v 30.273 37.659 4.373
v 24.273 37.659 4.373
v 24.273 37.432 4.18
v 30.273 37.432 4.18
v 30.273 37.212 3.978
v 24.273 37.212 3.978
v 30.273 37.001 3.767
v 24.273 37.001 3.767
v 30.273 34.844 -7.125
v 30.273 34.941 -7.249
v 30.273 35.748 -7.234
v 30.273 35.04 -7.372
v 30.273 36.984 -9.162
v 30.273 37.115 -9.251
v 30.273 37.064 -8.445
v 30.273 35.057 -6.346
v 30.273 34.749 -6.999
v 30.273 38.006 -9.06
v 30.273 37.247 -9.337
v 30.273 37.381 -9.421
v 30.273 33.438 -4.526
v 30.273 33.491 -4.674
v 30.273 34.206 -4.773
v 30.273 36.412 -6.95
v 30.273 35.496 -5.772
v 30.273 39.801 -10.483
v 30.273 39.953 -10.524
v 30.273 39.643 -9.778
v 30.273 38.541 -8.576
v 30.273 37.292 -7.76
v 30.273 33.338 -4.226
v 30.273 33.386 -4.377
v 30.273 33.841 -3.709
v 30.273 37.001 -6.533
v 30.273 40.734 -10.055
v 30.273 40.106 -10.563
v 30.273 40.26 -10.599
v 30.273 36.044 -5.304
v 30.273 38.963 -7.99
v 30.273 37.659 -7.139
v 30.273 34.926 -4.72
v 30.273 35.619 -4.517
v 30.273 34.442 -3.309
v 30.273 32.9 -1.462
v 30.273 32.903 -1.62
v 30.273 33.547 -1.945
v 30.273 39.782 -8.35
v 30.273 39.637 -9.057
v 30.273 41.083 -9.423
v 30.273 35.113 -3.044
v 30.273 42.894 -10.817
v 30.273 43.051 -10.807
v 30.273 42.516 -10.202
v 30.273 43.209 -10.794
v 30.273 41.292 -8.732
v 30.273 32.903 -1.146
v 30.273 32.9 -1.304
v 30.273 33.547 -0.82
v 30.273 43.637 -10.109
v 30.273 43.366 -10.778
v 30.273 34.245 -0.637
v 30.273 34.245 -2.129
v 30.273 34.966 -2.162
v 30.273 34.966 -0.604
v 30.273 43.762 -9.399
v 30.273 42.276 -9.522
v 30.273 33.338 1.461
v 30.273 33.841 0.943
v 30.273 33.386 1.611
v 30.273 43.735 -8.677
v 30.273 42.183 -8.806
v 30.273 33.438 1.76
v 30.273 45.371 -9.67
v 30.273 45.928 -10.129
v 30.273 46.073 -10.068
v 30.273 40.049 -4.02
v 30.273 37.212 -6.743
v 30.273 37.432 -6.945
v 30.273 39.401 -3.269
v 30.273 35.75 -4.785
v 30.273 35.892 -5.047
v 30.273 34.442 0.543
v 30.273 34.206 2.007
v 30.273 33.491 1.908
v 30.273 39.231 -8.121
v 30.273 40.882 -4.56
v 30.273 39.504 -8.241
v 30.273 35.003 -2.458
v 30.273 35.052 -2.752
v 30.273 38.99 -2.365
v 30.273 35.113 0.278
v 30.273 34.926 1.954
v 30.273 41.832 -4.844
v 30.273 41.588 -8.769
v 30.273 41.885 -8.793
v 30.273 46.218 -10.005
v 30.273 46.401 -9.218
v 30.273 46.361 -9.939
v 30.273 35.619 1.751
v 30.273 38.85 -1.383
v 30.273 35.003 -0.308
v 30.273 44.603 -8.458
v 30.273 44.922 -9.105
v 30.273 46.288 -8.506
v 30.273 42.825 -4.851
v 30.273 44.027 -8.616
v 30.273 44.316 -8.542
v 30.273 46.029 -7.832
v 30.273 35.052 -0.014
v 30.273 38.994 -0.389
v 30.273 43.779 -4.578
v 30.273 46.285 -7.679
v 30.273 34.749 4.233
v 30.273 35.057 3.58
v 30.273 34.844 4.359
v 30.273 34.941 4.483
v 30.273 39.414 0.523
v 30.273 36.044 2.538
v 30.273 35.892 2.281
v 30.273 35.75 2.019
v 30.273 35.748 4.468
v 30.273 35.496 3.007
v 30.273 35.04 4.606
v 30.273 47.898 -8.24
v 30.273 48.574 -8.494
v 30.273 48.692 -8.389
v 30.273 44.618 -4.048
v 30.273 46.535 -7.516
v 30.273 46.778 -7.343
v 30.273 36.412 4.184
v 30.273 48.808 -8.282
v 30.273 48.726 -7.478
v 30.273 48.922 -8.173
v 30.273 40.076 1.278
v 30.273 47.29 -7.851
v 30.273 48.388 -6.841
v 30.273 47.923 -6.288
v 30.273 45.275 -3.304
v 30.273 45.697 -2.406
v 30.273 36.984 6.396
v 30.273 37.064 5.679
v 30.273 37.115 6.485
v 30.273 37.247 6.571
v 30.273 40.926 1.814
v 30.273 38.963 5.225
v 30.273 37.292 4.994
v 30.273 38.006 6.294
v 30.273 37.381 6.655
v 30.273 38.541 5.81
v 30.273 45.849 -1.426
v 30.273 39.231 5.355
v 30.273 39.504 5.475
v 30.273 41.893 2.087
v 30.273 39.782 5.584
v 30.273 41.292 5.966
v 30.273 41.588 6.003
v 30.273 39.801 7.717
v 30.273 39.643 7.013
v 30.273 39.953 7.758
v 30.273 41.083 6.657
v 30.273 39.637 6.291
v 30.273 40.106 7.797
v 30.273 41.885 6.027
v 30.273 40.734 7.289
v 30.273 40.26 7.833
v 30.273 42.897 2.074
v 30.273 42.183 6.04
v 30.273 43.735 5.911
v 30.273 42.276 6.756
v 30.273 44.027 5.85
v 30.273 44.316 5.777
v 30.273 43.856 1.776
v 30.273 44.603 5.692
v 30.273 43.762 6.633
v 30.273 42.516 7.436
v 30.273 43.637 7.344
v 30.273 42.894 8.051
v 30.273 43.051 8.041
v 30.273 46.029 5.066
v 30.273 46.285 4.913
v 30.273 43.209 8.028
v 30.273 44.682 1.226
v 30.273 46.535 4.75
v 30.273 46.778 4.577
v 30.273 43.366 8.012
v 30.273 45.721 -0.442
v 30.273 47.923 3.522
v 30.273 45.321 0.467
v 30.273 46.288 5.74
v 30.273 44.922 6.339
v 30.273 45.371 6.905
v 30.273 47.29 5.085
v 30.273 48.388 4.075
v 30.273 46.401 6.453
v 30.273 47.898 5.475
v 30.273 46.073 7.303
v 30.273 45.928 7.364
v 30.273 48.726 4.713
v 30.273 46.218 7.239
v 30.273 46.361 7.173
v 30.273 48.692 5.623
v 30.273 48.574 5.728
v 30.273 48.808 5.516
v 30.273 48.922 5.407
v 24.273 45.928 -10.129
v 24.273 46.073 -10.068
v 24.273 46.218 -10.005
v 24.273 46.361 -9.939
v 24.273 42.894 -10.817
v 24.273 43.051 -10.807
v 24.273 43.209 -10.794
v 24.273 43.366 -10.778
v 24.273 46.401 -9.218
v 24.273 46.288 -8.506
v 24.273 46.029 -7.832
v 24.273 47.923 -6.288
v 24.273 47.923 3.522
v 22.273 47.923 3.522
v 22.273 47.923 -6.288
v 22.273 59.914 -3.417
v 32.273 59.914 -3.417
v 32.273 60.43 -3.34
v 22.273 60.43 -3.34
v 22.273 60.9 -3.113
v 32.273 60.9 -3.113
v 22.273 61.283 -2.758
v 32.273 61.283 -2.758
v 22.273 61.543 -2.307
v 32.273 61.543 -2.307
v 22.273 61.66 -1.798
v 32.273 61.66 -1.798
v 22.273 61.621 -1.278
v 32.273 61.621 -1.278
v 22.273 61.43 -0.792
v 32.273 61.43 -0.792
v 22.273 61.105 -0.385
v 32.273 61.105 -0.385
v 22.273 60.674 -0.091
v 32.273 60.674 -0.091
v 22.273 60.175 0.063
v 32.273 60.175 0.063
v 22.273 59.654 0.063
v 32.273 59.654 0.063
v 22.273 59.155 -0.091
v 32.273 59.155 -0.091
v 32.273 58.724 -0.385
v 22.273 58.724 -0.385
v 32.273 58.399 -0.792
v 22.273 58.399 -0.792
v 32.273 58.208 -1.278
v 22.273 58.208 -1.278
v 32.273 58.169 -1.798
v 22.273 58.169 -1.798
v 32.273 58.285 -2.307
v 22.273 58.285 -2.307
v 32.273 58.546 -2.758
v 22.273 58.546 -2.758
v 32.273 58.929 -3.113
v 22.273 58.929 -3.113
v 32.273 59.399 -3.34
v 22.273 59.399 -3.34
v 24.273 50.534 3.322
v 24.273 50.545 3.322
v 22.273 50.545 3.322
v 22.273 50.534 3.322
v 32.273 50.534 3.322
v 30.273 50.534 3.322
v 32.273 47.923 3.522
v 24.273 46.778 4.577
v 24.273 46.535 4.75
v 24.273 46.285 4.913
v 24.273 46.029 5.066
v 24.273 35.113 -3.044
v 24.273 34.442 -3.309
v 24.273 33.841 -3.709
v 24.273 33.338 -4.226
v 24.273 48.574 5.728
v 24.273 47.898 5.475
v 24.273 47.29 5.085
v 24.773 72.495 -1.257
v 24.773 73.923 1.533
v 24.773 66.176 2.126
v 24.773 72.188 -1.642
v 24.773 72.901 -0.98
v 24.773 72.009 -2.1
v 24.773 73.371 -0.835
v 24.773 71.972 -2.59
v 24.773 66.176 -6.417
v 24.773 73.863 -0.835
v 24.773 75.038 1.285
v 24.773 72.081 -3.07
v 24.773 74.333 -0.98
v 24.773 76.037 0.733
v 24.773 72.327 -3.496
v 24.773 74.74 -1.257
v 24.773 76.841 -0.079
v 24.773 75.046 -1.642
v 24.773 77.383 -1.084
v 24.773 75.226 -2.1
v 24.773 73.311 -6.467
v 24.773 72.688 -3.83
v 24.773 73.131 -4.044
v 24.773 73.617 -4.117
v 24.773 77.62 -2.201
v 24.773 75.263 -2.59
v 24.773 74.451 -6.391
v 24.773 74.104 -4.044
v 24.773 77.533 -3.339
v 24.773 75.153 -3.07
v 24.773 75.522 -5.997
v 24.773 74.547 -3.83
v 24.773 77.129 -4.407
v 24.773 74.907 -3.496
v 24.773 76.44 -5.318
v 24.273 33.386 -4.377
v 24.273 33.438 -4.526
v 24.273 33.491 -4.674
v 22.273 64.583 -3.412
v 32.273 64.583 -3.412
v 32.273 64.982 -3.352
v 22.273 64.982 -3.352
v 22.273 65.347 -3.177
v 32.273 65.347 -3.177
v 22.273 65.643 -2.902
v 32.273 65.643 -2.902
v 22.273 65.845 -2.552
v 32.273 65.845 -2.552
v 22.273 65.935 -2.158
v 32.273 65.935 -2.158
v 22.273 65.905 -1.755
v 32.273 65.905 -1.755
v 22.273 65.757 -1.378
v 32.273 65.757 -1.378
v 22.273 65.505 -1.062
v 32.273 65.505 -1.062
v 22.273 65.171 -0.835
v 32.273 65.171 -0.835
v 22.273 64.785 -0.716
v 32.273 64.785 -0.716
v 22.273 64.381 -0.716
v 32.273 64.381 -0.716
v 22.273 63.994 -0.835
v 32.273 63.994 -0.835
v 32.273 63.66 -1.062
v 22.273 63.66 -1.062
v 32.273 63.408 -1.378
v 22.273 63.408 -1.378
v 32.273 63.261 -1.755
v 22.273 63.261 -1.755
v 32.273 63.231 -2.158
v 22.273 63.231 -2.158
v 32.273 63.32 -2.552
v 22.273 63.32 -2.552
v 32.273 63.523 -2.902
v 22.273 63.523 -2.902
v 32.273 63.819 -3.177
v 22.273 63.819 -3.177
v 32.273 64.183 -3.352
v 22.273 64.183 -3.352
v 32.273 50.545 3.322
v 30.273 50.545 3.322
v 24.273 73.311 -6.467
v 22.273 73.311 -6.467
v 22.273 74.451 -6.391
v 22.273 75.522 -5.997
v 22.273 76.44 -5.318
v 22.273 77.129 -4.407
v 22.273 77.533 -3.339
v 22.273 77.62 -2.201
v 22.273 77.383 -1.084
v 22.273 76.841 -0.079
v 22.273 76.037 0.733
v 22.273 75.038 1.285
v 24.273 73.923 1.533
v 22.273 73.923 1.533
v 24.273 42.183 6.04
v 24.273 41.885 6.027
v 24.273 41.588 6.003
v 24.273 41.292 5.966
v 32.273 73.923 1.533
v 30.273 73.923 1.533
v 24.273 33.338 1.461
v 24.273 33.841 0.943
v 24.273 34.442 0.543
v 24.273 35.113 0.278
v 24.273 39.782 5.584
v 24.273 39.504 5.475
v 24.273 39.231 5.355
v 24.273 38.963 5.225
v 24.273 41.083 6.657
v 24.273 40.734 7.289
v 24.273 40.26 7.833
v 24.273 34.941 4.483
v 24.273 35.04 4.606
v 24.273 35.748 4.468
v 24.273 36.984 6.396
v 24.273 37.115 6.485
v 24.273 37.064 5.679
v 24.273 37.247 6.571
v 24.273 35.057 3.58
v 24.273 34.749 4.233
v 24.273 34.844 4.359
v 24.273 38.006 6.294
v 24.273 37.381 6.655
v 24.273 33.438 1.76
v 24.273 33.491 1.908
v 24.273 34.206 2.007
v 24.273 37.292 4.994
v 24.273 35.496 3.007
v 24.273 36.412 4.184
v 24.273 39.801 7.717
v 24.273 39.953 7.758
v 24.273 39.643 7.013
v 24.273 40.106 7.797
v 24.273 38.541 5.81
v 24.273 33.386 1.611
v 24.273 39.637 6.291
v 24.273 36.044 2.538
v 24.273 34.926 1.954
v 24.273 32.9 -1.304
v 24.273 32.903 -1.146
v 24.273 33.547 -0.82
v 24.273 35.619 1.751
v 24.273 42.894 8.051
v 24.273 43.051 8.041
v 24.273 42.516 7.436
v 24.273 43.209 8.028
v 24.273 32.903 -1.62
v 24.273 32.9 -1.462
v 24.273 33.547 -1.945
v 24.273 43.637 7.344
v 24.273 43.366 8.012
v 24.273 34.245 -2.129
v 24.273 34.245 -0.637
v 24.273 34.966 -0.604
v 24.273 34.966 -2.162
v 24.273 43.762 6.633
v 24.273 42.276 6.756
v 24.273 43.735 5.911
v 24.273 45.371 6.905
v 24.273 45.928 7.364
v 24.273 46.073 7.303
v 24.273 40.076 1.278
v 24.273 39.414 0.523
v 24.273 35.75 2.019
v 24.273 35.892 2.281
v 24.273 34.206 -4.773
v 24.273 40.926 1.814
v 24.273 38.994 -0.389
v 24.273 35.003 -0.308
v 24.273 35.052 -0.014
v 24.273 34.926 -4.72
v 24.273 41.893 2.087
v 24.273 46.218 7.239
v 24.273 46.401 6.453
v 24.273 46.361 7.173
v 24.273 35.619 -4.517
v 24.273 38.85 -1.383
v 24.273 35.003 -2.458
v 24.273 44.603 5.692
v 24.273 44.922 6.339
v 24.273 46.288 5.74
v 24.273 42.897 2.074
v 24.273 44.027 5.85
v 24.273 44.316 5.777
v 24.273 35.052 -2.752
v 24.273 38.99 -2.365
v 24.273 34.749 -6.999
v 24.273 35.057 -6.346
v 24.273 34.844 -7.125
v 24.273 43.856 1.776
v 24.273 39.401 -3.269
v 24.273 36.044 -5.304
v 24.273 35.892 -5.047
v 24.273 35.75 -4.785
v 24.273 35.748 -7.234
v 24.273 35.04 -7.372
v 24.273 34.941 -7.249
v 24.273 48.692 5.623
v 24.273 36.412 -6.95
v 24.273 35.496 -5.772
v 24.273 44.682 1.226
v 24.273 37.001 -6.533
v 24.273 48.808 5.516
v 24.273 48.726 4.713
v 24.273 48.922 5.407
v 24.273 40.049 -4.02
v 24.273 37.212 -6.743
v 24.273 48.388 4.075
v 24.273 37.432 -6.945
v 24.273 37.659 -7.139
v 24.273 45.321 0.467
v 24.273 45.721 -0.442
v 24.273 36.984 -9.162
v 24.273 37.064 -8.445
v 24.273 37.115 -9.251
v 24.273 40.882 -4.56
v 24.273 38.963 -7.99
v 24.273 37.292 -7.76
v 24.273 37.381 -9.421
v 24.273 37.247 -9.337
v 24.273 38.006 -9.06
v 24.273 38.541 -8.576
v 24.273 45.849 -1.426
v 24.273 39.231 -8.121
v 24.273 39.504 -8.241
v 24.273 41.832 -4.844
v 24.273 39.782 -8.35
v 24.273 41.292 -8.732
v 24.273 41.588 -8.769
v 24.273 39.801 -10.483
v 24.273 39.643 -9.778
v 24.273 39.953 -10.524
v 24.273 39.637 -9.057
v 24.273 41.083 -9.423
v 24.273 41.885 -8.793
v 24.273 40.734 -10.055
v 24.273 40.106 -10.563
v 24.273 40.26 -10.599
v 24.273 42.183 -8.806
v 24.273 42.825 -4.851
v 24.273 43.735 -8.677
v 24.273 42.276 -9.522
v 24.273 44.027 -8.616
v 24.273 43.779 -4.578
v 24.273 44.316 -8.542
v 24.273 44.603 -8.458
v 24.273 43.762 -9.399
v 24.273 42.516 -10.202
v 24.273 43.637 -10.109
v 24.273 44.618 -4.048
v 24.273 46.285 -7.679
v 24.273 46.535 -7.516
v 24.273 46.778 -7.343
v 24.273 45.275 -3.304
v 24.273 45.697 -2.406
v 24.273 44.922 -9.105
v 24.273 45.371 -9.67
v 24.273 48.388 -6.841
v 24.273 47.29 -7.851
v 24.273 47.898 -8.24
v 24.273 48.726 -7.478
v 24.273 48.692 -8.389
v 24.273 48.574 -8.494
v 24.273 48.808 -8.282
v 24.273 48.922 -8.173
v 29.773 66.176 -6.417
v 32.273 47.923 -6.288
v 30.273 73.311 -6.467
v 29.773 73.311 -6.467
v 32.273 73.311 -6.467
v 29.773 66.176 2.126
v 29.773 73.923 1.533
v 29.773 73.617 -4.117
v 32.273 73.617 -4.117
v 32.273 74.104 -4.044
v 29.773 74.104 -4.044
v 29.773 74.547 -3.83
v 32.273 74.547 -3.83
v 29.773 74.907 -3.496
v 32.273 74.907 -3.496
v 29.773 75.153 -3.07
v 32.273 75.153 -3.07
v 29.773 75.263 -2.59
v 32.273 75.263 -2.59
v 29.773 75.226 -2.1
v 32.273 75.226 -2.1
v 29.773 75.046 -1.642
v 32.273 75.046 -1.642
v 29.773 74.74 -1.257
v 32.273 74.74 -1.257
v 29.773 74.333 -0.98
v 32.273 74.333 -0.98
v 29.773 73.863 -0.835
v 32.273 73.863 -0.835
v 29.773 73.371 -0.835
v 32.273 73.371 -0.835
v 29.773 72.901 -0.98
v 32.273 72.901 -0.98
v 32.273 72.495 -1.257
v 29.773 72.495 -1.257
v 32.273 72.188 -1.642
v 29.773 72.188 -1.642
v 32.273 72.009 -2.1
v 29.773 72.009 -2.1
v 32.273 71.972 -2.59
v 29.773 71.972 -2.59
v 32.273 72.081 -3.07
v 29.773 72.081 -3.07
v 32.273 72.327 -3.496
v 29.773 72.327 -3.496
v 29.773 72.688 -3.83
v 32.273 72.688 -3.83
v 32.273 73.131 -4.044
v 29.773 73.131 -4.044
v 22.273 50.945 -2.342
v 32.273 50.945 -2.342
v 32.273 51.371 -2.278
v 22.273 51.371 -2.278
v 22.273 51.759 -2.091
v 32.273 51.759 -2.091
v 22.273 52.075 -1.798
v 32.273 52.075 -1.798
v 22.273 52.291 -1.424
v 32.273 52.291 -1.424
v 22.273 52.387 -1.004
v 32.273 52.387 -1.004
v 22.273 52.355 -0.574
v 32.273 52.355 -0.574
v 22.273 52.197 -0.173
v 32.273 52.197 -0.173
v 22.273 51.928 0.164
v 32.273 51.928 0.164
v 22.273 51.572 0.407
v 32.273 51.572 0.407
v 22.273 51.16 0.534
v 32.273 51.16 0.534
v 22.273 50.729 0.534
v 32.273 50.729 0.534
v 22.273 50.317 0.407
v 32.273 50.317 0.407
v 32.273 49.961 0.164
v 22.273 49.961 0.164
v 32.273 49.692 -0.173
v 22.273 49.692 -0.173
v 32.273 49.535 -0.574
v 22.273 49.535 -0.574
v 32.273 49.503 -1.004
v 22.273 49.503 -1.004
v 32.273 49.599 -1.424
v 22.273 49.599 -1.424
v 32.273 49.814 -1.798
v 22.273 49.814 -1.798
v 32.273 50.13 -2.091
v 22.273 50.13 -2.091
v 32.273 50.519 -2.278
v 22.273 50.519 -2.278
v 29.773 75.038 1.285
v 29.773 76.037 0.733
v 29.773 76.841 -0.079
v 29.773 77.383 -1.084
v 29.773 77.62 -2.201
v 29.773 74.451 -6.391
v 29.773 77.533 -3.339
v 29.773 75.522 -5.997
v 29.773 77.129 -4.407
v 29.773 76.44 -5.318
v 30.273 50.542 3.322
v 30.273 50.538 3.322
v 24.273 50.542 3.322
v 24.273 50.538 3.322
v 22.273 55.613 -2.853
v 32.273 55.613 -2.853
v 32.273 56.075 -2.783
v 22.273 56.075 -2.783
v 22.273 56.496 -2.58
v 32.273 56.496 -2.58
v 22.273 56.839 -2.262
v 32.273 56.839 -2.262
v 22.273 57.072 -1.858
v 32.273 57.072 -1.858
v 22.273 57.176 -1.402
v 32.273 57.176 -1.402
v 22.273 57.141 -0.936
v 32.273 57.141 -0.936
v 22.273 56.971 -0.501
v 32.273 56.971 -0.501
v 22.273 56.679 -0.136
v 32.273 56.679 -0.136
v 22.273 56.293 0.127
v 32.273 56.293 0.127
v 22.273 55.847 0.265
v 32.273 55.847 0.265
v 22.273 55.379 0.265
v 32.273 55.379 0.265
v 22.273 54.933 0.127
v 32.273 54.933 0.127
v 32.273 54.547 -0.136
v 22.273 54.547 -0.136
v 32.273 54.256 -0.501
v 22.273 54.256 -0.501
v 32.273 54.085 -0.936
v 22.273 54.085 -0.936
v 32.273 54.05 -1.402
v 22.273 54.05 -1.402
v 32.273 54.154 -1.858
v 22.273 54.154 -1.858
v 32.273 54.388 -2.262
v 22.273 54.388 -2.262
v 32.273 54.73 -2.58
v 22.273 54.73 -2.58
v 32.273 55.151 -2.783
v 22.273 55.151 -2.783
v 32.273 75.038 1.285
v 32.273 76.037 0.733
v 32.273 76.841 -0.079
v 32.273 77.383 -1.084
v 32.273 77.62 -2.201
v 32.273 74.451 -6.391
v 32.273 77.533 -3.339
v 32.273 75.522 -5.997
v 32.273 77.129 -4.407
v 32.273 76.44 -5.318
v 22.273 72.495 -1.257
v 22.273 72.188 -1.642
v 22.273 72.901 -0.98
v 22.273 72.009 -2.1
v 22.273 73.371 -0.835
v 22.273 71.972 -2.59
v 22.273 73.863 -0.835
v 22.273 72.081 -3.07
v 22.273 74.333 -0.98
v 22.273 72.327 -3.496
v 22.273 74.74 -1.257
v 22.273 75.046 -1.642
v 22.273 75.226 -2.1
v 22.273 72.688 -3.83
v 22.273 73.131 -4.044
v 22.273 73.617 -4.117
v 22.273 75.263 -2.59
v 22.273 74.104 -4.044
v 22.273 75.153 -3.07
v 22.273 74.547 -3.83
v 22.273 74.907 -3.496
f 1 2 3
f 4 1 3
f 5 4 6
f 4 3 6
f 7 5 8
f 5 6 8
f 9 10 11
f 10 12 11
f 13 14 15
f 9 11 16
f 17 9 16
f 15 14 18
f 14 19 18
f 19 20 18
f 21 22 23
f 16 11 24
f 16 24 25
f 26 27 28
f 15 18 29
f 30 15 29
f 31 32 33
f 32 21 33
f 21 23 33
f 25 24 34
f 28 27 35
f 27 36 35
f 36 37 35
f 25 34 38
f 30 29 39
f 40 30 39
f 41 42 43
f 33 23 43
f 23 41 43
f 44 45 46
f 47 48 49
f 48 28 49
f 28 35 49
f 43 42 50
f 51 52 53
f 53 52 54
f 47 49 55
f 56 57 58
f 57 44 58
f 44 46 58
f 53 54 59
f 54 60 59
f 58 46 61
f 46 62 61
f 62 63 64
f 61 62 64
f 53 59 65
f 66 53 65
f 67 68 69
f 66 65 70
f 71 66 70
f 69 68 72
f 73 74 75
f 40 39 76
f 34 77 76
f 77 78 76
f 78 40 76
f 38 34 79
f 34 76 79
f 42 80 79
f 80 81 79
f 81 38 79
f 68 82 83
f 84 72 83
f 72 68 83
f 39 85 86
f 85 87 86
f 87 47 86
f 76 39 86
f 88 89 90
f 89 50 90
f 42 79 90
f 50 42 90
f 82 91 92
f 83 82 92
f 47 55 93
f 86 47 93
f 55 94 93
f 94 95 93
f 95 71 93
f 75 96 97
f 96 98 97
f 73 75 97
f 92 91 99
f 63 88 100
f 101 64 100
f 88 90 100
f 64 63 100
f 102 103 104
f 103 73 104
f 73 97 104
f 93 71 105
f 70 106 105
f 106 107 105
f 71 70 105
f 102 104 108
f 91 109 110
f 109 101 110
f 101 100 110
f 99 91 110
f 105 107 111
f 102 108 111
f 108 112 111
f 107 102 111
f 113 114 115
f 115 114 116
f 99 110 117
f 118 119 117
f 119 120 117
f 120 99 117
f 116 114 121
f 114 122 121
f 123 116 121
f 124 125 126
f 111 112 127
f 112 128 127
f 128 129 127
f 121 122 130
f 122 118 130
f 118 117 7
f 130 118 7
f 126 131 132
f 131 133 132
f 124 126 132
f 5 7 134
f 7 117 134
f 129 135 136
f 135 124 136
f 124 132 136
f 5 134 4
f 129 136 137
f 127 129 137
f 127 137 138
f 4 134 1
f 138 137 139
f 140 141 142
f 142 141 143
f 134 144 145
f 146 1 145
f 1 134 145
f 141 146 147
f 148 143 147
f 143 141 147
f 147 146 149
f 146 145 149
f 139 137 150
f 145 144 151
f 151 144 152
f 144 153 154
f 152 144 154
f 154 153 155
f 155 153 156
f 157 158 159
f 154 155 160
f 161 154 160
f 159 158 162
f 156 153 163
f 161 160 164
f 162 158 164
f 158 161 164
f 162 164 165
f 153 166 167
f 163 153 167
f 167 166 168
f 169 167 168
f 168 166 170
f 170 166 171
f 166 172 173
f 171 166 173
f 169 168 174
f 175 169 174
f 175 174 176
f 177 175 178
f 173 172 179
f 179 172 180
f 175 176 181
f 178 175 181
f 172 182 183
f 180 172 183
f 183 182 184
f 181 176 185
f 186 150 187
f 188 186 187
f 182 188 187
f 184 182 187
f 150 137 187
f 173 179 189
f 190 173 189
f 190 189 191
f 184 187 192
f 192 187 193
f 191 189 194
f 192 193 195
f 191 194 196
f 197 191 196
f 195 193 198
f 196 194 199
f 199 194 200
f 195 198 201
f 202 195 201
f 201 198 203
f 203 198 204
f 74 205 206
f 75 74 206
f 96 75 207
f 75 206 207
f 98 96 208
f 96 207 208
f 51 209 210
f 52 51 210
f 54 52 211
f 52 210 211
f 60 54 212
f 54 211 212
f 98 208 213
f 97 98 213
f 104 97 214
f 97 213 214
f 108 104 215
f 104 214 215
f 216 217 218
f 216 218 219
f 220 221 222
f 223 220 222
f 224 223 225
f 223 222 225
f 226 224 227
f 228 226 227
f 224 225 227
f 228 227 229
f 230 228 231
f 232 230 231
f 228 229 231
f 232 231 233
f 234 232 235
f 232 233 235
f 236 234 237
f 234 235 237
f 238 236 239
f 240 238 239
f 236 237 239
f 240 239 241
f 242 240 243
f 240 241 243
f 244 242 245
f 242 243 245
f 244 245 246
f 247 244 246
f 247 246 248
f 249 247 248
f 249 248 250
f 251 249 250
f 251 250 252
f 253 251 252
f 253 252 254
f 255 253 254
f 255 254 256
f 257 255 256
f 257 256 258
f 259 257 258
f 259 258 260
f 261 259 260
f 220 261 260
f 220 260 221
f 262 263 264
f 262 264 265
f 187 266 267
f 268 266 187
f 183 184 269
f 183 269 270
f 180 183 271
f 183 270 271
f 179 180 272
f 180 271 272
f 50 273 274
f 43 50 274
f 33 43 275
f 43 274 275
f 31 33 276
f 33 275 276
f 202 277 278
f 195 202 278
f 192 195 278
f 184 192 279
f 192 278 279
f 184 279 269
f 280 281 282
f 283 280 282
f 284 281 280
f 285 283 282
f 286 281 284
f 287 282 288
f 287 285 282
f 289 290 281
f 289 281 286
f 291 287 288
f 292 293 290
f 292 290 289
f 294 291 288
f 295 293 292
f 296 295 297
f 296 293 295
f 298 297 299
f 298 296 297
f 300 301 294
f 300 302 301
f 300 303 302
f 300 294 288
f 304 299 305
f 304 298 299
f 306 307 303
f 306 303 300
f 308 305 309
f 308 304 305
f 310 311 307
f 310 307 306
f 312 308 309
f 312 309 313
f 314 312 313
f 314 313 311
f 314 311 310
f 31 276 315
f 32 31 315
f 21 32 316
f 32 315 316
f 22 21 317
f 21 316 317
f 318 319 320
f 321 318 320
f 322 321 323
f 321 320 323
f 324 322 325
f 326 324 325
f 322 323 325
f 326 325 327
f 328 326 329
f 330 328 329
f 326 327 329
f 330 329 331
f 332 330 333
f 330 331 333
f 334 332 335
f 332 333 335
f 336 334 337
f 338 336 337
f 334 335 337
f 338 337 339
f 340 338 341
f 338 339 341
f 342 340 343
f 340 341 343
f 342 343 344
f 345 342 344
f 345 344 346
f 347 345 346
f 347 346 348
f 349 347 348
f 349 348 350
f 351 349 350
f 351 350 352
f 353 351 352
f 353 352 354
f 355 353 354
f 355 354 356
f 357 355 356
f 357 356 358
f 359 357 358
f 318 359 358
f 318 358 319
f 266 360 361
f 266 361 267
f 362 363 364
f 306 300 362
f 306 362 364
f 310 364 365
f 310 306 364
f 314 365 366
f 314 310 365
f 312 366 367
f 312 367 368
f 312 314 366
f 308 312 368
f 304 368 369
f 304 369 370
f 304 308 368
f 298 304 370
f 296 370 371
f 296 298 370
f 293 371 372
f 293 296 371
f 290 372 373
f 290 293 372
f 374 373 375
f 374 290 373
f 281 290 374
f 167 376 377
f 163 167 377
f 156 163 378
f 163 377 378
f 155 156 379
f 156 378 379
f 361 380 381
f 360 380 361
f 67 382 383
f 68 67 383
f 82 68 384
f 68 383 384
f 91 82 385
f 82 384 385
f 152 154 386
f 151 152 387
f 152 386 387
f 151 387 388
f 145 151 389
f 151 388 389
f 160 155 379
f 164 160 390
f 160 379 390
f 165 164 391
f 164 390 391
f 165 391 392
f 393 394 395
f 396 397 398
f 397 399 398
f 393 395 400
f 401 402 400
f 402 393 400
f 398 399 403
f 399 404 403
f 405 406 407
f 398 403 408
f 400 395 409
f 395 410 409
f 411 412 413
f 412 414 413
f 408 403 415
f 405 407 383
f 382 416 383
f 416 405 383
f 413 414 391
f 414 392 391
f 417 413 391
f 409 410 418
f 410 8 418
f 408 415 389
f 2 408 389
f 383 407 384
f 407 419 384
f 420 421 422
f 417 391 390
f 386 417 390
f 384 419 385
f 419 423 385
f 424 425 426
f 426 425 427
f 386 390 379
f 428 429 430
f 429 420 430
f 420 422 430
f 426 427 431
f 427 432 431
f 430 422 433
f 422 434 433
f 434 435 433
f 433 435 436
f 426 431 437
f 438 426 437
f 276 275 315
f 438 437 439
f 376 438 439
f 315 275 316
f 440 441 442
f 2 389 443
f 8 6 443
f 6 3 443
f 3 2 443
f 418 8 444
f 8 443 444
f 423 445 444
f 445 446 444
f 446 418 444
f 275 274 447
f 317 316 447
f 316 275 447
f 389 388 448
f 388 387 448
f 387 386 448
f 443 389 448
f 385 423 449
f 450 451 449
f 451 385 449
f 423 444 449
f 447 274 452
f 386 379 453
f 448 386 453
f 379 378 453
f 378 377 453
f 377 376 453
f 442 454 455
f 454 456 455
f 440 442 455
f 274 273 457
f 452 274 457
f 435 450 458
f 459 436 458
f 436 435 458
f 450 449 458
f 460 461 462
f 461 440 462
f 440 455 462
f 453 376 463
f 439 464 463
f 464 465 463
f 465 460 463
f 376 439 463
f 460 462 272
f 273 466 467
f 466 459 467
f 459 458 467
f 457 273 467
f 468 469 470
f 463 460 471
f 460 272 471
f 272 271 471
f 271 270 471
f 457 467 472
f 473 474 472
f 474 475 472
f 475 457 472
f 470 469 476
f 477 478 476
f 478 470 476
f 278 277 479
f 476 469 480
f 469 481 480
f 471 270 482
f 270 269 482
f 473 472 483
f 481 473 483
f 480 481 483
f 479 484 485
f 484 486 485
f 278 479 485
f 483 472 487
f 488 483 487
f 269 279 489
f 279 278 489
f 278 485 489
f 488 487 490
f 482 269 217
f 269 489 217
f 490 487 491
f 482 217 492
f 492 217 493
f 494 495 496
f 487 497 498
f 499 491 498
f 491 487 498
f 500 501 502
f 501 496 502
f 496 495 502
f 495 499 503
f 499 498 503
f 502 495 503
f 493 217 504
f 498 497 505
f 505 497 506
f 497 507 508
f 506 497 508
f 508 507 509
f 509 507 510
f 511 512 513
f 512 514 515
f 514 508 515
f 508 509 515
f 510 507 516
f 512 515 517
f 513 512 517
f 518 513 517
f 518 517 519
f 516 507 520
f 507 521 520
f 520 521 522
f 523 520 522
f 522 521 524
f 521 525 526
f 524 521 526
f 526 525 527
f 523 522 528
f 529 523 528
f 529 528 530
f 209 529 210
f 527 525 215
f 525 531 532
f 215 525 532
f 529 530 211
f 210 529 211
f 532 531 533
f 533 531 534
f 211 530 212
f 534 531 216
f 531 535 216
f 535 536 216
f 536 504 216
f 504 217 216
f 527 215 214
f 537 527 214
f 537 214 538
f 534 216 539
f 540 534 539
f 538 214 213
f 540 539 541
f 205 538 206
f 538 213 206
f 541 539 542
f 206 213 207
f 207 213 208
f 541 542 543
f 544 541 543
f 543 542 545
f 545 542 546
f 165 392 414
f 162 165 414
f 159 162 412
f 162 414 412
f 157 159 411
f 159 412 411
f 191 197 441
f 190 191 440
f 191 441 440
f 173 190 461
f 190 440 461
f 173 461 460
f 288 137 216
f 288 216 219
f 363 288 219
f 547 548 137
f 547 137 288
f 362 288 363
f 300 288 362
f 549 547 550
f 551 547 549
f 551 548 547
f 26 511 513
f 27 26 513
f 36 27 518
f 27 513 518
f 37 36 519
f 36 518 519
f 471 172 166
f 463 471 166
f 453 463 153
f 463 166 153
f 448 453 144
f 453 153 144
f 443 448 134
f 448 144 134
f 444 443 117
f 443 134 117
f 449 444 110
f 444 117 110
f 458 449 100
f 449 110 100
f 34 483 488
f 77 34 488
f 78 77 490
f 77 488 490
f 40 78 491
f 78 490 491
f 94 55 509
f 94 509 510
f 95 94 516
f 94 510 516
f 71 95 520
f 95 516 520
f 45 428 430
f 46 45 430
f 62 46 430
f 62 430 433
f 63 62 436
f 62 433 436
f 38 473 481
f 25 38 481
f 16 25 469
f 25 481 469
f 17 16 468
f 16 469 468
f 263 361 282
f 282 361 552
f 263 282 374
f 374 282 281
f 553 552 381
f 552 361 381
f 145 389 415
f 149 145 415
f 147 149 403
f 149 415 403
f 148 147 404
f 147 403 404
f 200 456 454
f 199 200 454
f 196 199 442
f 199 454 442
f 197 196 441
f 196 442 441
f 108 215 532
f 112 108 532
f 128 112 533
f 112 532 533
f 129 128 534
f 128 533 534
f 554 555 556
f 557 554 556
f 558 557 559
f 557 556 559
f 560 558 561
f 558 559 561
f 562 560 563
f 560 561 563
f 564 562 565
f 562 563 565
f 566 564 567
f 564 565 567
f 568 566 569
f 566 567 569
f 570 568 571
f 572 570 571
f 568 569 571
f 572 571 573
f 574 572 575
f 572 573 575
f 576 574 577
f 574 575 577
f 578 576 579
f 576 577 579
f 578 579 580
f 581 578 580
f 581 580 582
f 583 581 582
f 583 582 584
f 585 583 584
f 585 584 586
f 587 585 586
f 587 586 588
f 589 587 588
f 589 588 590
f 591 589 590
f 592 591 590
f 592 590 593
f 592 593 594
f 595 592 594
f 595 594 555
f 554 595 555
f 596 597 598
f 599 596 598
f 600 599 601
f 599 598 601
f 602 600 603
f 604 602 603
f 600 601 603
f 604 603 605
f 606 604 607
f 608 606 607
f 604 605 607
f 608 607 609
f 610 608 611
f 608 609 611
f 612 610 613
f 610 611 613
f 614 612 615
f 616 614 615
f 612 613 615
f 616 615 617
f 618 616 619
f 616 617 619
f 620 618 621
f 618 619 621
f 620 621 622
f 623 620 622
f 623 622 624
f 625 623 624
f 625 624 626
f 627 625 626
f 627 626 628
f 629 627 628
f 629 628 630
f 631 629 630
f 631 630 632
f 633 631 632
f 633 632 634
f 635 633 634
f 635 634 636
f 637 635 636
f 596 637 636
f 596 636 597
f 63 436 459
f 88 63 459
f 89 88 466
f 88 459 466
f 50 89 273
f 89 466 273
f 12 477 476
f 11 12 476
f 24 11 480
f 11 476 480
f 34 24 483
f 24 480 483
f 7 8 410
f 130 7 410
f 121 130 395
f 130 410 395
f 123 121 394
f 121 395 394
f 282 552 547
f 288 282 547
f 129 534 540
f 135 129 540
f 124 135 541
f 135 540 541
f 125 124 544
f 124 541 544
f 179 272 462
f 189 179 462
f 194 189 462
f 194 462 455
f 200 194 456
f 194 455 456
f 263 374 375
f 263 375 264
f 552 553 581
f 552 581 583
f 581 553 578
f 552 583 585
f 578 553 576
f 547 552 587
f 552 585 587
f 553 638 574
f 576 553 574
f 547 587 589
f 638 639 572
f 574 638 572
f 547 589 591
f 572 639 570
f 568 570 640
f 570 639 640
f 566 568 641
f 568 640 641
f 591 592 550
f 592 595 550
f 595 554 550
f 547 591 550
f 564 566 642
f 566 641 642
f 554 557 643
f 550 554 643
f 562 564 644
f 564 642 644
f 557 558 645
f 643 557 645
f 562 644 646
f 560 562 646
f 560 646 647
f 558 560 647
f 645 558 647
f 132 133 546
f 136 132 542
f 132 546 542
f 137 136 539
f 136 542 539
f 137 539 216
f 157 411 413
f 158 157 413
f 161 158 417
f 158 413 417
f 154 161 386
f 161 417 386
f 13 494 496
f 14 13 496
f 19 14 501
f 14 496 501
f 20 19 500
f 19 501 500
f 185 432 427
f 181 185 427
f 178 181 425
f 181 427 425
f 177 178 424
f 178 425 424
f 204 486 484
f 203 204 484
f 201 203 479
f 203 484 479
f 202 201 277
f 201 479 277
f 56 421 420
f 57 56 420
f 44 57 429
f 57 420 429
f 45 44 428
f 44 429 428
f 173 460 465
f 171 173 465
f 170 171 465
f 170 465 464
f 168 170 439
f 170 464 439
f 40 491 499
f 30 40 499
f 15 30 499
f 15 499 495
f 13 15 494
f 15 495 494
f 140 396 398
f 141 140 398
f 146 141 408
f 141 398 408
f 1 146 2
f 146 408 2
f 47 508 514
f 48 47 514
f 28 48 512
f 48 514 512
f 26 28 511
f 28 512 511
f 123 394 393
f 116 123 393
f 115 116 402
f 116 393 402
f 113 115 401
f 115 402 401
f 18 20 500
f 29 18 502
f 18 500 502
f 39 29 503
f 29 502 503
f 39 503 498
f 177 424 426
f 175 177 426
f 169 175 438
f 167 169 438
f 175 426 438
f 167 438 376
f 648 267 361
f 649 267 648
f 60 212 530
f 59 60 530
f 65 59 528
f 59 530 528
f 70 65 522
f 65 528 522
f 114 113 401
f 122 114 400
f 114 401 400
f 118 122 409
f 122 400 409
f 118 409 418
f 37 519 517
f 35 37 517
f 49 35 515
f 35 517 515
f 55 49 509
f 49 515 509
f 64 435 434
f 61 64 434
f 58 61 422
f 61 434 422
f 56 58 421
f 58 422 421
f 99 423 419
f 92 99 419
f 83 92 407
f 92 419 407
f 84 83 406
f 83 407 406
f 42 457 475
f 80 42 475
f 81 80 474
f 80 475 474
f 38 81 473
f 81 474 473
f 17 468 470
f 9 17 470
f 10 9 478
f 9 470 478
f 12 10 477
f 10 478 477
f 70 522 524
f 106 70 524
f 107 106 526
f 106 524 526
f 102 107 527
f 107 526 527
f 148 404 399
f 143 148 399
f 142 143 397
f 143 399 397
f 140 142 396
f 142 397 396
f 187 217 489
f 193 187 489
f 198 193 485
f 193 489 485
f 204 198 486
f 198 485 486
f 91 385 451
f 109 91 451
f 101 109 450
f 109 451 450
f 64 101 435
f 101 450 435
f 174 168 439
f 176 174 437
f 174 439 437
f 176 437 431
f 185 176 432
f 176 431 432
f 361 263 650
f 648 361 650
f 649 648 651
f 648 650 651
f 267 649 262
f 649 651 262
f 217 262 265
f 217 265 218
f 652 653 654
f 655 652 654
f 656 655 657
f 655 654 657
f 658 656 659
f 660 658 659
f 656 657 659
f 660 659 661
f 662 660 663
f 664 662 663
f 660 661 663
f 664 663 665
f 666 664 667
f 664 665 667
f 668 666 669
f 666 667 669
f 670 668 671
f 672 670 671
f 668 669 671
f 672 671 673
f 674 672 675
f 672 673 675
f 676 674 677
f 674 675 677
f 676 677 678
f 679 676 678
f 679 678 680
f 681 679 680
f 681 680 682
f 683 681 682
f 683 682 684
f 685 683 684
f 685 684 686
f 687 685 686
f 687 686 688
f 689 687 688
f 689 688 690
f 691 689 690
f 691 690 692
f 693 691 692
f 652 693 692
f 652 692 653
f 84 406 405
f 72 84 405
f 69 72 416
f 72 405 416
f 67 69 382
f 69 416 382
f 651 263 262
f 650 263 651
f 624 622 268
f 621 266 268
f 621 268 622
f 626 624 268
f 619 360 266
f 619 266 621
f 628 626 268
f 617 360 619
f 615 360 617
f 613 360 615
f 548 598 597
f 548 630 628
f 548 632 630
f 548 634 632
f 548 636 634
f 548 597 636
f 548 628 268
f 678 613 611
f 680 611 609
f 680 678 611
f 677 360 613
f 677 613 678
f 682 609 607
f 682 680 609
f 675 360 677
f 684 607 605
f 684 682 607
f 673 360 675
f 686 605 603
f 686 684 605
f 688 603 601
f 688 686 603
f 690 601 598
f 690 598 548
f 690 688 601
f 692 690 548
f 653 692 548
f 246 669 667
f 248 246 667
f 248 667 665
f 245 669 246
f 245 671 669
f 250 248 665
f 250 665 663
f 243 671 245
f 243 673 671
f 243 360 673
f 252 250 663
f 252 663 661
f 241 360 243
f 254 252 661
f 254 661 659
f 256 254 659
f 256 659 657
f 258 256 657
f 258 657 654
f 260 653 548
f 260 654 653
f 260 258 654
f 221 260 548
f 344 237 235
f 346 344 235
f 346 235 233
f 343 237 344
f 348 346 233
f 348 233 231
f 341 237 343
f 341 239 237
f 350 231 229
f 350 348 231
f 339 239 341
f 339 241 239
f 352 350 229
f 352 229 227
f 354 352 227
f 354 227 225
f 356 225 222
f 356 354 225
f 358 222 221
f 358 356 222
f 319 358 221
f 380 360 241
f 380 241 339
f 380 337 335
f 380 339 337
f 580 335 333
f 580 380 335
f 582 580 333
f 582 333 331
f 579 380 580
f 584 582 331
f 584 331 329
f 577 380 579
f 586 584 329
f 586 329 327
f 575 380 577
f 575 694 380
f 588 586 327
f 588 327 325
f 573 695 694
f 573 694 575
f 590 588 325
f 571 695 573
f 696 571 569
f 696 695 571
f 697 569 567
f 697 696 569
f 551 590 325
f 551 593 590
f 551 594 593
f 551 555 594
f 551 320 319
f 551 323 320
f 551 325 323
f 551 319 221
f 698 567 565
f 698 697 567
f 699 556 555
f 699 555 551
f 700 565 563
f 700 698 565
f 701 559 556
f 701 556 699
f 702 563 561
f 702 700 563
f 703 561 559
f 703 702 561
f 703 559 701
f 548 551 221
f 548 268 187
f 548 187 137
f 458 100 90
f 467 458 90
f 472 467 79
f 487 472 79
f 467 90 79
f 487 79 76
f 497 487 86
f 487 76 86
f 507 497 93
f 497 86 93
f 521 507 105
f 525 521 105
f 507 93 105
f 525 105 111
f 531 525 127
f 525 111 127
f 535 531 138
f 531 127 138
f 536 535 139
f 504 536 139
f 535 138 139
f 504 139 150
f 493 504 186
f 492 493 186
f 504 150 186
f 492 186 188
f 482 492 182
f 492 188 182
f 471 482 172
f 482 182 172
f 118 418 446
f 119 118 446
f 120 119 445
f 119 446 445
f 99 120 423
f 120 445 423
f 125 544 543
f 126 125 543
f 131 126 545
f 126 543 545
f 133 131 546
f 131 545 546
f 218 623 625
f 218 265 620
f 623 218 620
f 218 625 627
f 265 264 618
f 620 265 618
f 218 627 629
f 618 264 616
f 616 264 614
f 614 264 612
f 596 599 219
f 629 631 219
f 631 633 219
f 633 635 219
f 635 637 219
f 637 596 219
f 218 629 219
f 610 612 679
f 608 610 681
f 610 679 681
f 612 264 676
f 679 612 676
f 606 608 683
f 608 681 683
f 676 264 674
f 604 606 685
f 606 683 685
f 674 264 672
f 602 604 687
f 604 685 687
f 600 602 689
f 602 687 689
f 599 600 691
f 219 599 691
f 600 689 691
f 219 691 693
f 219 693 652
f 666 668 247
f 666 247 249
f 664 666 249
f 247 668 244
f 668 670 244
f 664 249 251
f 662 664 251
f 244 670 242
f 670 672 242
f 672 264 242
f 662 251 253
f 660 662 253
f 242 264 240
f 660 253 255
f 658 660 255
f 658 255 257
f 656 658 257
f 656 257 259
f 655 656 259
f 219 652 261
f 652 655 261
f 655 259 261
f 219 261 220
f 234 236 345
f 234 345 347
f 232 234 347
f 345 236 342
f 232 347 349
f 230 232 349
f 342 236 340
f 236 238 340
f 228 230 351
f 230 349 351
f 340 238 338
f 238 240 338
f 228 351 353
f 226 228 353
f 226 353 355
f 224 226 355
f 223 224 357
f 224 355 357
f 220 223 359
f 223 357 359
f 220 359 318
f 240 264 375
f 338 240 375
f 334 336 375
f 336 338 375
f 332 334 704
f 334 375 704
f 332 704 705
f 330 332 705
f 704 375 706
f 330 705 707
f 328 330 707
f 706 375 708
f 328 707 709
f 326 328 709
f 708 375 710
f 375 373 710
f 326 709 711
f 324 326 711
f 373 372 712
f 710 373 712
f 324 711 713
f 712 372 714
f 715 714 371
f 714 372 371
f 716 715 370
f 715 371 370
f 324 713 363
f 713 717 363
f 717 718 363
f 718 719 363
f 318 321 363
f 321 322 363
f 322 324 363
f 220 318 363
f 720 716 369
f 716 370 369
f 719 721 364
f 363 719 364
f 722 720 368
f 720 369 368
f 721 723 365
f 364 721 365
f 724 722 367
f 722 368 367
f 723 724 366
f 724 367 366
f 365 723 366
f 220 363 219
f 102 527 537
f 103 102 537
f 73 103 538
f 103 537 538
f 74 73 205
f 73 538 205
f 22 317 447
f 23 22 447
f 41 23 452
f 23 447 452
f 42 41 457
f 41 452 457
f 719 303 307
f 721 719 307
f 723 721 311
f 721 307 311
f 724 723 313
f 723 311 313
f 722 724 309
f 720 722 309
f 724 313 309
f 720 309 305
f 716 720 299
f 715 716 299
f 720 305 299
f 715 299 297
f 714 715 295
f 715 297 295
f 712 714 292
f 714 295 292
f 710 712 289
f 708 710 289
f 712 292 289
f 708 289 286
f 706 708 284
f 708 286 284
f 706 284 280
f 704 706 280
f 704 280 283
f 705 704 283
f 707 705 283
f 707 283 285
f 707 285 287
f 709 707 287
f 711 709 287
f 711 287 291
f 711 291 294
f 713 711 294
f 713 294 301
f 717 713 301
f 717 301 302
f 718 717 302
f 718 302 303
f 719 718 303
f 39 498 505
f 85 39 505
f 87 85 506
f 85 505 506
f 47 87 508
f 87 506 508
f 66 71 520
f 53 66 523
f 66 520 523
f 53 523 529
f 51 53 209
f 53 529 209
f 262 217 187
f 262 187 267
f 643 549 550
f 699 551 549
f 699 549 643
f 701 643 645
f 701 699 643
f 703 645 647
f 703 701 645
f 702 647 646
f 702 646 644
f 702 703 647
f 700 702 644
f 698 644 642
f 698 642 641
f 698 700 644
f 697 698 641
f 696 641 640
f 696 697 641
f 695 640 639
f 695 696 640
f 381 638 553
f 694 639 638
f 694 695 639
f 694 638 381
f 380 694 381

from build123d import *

# Parameters (mm, degrees)
SPUR_START             = -32.726855157
SPUR_GEAR_GB_OUTLINE_R = 22.5
SPUR_GEAR_GB_DEPTH     = 75
SKETCH_2_R             = 56.152658256
CUT_EXTRUDE_1_DEPTH    = 45
EXTRUDE_1_DEPTH        = 30
EXTRUDE_START          = -30
SKETCH_5_R             = 22.5
EXTRUDE_2_DEPTH        = 30
SCALE_1_SCALE          = 0.2
CUT_EXTRUDE_3_DEPTH    = 10
EXTRUDE_3_DEPTH        = 5
SKETCH_8_R             = 1.65
CUT_EXTRUDE_4_DEPTH    = 10
SKETCH_9_W             = 18.454746183
SKETCH_9_H             = 13.449677925
CUT_EXTRUDE_5_DEPTH    = 2.5
SKETCH_10_R            = 1.446114005
SKETCH_10_R_2          = 1.567494057
SKETCH_10_R_3          = 1.749983797
SKETCH_10_R_4          = 1.35600832
CUT_EXTRUDE_6_DEPTH    = 80.014451116


# Read off the part's stored shape, not the designer's step: spur gear_gb
with BuildPart() as part:
    # spur gear_gb outline → spur gear_gb (new body)
    with BuildSketch(Plane.YZ.offset(SPUR_START)):
        with BuildLine():
            ThreePointArc((32.862431273, 33.858374177), (32.001554259, 34.671025411), (31.120587981, 35.461853886))
            ThreePointArc((31.120587981, 35.461853886), (26.170323532, 33.302671085), (22.140322459, 29.707357493))
            ThreePointArc((22.140322459, 29.707357493), (20.304903422, 30.987038971), (18.395725829, 32.153824573))
            ThreePointArc((18.395725829, 32.153824573), (20.069385125, 37.288613083), (20.058208562, 42.689267077))
            ThreePointArc((20.058208562, 42.689267077), (18.980108815, 43.178360316), (17.890094133, 43.64029024))
            ThreePointArc((17.890094133, 43.64029024), (13.909134176, 39.99074968), (11.264886092, 35.281700885))
            ThreePointArc((11.264886092, 35.281700885), (9.113403224, 35.896086104), (6.928815473, 36.379743093))
            ThreePointArc((6.928815473, 36.379743093), (6.844528189, 41.779750883), (5.080367717, 46.884153523))
            ThreePointArc((5.080367717, 46.884153523), (3.901874073, 46.996687926), (2.720930993, 47.079662024))
            ThreePointArc((2.720930993, 47.079662024), (0.14067431, 42.335248053), (-0.831275476, 37.022762562))
            ThreePointArc((-0.831275476, 37.022762562), (-3.065675621, 36.90527335), (-5.28893955, 36.653389986))
            ThreePointArc((-5.28893955, 36.653389986), (-7.12203958, 41.733442422), (-10.448009799, 45.988452479))
            ThreePointArc((-10.448009799, 45.988452479), (-11.599189267, 45.712233197), (-12.74308724, 45.407259939))
            ThreePointArc((-12.74308724, 45.407259939), (-13.643029801, 40.082103428), (-12.837355447, 34.741871474))
            ThreePointArc((-12.837355447, 34.741871474), (-14.912540945, 33.90523961), (-16.933555907, 32.945111364))
            ThreePointArc((-16.933555907, 32.945111364), (-20.316823851, 37.154705941), (-24.844183336, 40.099227051))
            ThreePointArc((-24.844183336, 40.099227051), (-25.843300471, 39.464186729), (-26.826194241, 38.804314699))
            ThreePointArc((-26.826194241, 38.804314699), (-25.948299939, 33.475478984), (-23.452308764, 28.686197563))
            ThreePointArc((-23.452308764, 28.686197563), (-25.143401065, 27.221085091), (-26.74315873, 25.656756756))
            ThreePointArc((-26.74315873, 25.656756756), (-31.309965009, 28.539718582), (-36.548104111, 29.854666195))
            ThreePointArc((-36.548104111, 29.854666195), (-37.286889069, 28.929621306), (-38.002266845, 27.986357877))
            ThreePointArc((-38.002266845, 27.986357877), (-35.44166915, 23.231304993), (-31.525840525, 19.51196706))
            ThreePointArc((-31.525840525, 19.51196706), (-32.64958354, 17.577141651), (-33.654725342, 15.578132475))
            ThreePointArc((-33.654725342, 15.578132475), (-38.910185635, 16.822047902), (-44.291470704, 16.364927041))
            ThreePointArc((-44.291470704, 16.364927041), (-44.68986467, 15.250120552), (-45.060204171, 14.125682952))
            ThreePointArc((-45.060204171, 14.125682952), (-41.094383574, 10.459696662), (-36.183058293, 8.213350193))
            ThreePointArc((-36.183058293, 8.213350193), (-36.617677028, 6.018480201), (-36.919280256, 3.801413847))
            ThreePointArc((-36.919280256, 3.801413847), (-42.293883893, 3.271485337), (-47.235169193, 1.091832139))
            ThreePointArc((-47.235169193, 1.091832139), (-47.25, -0.091929368), (-47.235169193, -1.275690876))
            ThreePointArc((-47.235169193, -1.275690876), (-42.293883893, -3.455344074), (-36.919280256, -3.985272584))
            ThreePointArc((-36.919280256, -3.985272584), (-36.617677028, -6.202338938), (-36.183058293, -8.39720893))
            ThreePointArc((-36.183058293, -8.39720893), (-41.094383574, -10.643555399), (-45.060204171, -14.309541689))
            ThreePointArc((-45.060204171, -14.309541689), (-44.68986467, -15.433979288), (-44.291470704, -16.548785777))
            ThreePointArc((-44.291470704, -16.548785777), (-38.910185635, -17.005906639), (-33.654725342, -15.761991212))
            ThreePointArc((-33.654725342, -15.761991212), (-32.64958354, -17.761000388), (-31.525840525, -19.695825796))
            ThreePointArc((-31.525840525, -19.695825796), (-35.44166915, -23.41516373), (-38.002266845, -28.170216613))
            ThreePointArc((-38.002266845, -28.170216613), (-37.286889069, -29.113480043), (-36.548104111, -30.038524932))
            ThreePointArc((-36.548104111, -30.038524932), (-31.309965009, -28.723577319), (-26.74315873, -25.840615493))
            ThreePointArc((-26.74315873, -25.840615493), (-25.143401065, -27.404943828), (-23.452308764, -28.870056299))
            ThreePointArc((-23.452308764, -28.870056299), (-25.948299939, -33.65933772), (-26.826194241, -38.988173435))
            ThreePointArc((-26.826194241, -38.988173435), (-25.843300471, -39.648045466), (-24.844183336, -40.283085788))
            ThreePointArc((-24.844183336, -40.283085788), (-20.316823851, -37.338564677), (-16.933555907, -33.128970101))
            ThreePointArc((-16.933555907, -33.128970101), (-14.912540945, -34.089098347), (-12.837355447, -34.925730211))
            ThreePointArc((-12.837355447, -34.925730211), (-13.643029801, -40.265962164), (-12.74308724, -45.591118675))
            ThreePointArc((-12.74308724, -45.591118675), (-11.599189267, -45.896091934), (-10.448009799, -46.172311216))
            ThreePointArc((-10.448009799, -46.172311216), (-7.12203958, -41.917301159), (-5.28893955, -36.837248723))
            ThreePointArc((-5.28893955, -36.837248723), (-3.065675621, -37.089132087), (-0.831275476, -37.206621299))
            ThreePointArc((-0.831275476, -37.206621299), (0.14067431, -42.51910679), (2.720930993, -47.263520761))
            ThreePointArc((2.720930993, -47.263520761), (3.901874073, -47.180546663), (5.080367717, -47.06801226))
            ThreePointArc((5.080367717, -47.06801226), (6.844528189, -41.96360962), (6.928815473, -36.56360183))
            ThreePointArc((6.928815473, -36.56360183), (9.113403224, -36.079944841), (11.264886092, -35.465559622))
            ThreePointArc((11.264886092, -35.465559622), (13.909134176, -40.174608417), (17.890094133, -43.824148977))
            ThreePointArc((17.890094133, -43.824148977), (18.980108815, -43.362219053), (20.058208562, -42.873125814))
            ThreePointArc((20.058208562, -42.873125814), (20.069385125, -37.47247182), (18.395725829, -32.33768331))
            ThreePointArc((18.395725829, -32.33768331), (20.304903422, -31.170897707), (22.140322459, -29.891216229))
            ThreePointArc((22.140322459, -29.891216229), (26.170323532, -33.486529822), (31.120587981, -35.645712623))
            ThreePointArc((31.120587981, -35.645712623), (32.001554259, -34.854884148), (32.862431273, -34.042232914))
            ThreePointArc((32.862431273, -34.042232914), (31.119412774, -28.930572226), (27.869173851, -24.617437006))
            ThreePointArc((27.869173851, -24.617437006), (29.296052271, -22.893962115), (30.616511345, -21.087657722))
            ThreePointArc((30.616511345, -21.087657722), (35.595552259, -23.179628097), (40.978683235, -23.614472179))
            ThreePointArc((40.978683235, -23.614472179), (41.555134745, -22.58044369), (42.105499643, -21.532297832))
            ThreePointArc((42.105499643, -21.532297832), (38.797169181, -17.2635582), (34.322564452, -14.239471396))
            ThreePointArc((34.322564452, -14.239471396), (35.112519281, -12.146072463), (35.774926162, -10.008886264))
            ThreePointArc((35.774926162, -10.008886264), (41.163450577, -10.370815972), (46.396102311, -9.034199232))
            ThreePointArc((46.396102311, -9.034199232), (46.605571586, -7.869023759), (46.785783792, -6.698966145))
            ThreePointArc((46.785783792, -6.698966145), (42.270650308, -3.735731746), (37.056572625, -2.328400087))
            ThreePointArc((37.056572625, -2.328400087), (37.124, -0.091929368), (37.056572625, 2.14454135))
            ThreePointArc((37.056572625, 2.14454135), (42.270650308, 3.551873009), (46.785783792, 6.515107408))
            ThreePointArc((46.785783792, 6.515107408), (46.605571586, 7.685165023), (46.396102311, 8.850340496))
            ThreePointArc((46.396102311, 8.850340496), (41.163450577, 10.186957235), (35.774926162, 9.825027527))
            ThreePointArc((35.774926162, 9.825027527), (35.112519281, 11.962213726), (34.322564452, 14.05561266))
            ThreePointArc((34.322564452, 14.05561266), (38.797169181, 17.079699464), (42.105499643, 21.348439095))
            ThreePointArc((42.105499643, 21.348439095), (41.555134745, 22.396584953), (40.978683235, 23.430613443))
            ThreePointArc((40.978683235, 23.430613443), (35.595552259, 22.99576936), (30.616511345, 20.903798985))
            ThreePointArc((30.616511345, 20.903798985), (29.296052271, 22.710103378), (27.869173851, 24.433578269))
            ThreePointArc((27.869173851, 24.433578269), (31.119412774, 28.746713489), (32.862431273, 33.858374177))
        make_face()
        with Locations((0, -0.091929368)):
            Circle(SPUR_GEAR_GB_OUTLINE_R, mode=Mode.SUBTRACT)
    extrude(amount=SPUR_GEAR_GB_DEPTH)

    # 草图2 → 切除-拉伸1 (cut)
    with BuildSketch(Plane.ZY.offset(32.726855157)):
        with Locations((-0.091929368, 0)):
            Circle(SKETCH_2_R)
    extrude(amount=-CUT_EXTRUDE_1_DEPTH, mode=Mode.SUBTRACT)

    # 草图4 → 凸台-拉伸1 (add)
    with BuildSketch(Plane(origin=(42.273144843, 0, 0), x_dir=(0, 0, -1), z_dir=(1, 0, 0))):
        with BuildLine():
            Line((-24.433578269, 27.869173851), (-23.430613443, 40.978683235))
            Line((-23.430613443, 40.978683235), (-14.487711984, 157.869173851))
            ThreePointArc((-14.487711984, 157.869173851), (7.042421291, 176.339040577), (25.512288016, 154.808907302))
            Line((25.512288016, 154.808907302), (24.617437006, 27.869173851))
            Line((24.617437006, 27.869173851), (-24.433578269, 27.869173851))
        make_face()
    extrude(amount=-EXTRUDE_1_DEPTH)

    # 草图5 → 凸台-拉伸2 (add)
    with BuildSketch(Plane(origin=(42.273144843, 0, 0), x_dir=(0, 0, -1), z_dir=(1, 0, 0)).offset(EXTRUDE_START)):
        with Locations((0.091929368, 0)):
            Circle(SKETCH_5_R)
    extrude(amount=EXTRUDE_2_DEPTH)


with BuildPart() as part_1:
    # 缩放比例1: scaled about (27.273144843, 52.936955481, -1.705643422)
    add(part.part.scale(SCALE_1_SCALE).moved(Location((21.818515874, 42.349564385, -1.364514738))))

    # 草图6 → 切除-拉伸3 (cut)
    with BuildSketch(Plane(origin=(30.273144843, 0, 0), x_dir=(0, 0, -1), z_dir=(1, 0, 0))):
        with BuildLine():
            ThreePointArc((1.382900611, 38.849564385), (4.342900611, 44.217290275), (-1.776224322, 43.856192956))
            ThreePointArc((-1.776224322, 43.856192956), (-1.577099389, 40.481838495), (1.382900611, 38.849564385))
        make_face()
    extrude(amount=-CUT_EXTRUDE_3_DEPTH, mode=Mode.SUBTRACT)

    # 草图7 → 凸台-拉伸3 (add, symmetric)
    with BuildSketch(Plane(origin=(27.273144843, 0, 0), x_dir=(0, 0, -1), z_dir=(1, 0, 0))):
        with BuildLine():
            Line((6.288002139, 47.923399155), (6.466972341, 73.311345845))
            ThreePointArc((6.466972341, 73.311345845), (2.772998996, 77.6173725), (-1.533027659, 73.923399155))
            Line((-1.533027659, 73.923399155), (-3.321607951, 50.545301032))
            Line((-3.321607951, 50.545301032), (-3.322451181, 50.53427937))
            Line((-3.322451181, 50.53427937), (-3.522200916, 47.923399155))
            Line((-3.522200916, 47.923399155), (6.288002139, 47.923399155))
        make_face()
    extrude(amount=EXTRUDE_3_DEPTH, both=True)

    # 草图8 → 切除-拉伸4 (cut)
    with BuildSketch(Plane(origin=(32.273144843, 0, 0), x_dir=(0, 0, -1), z_dir=(1, 0, 0))):
        with Locations((2.466972341, 73.6173725)):
            Circle(SKETCH_8_R)
    extrude(amount=-CUT_EXTRUDE_4_DEPTH, mode=Mode.SUBTRACT)

    # 草图9 → 切除-拉伸5 (cut, symmetric)
    with BuildSketch(Plane(origin=(27.273144843, 0, 0), x_dir=(0, 0, -1), z_dir=(1, 0, 0))):
        with Locations((1.880211444, 72.900415106)):
            Rectangle(SKETCH_9_W, SKETCH_9_H)
    extrude(amount=CUT_EXTRUDE_5_DEPTH, both=True, mode=Mode.SUBTRACT)

    # 草图10 → 切除-拉伸6 (cut, through all)
    with BuildSketch(Plane(origin=(32.273144843, 0, 0), x_dir=(0, 0, -1), z_dir=(1, 0, 0))):
        with Locations((0.89588905, 50.944816989)):
            Circle(SKETCH_10_R)
        with Locations((1.285013172, 55.613074907)):
            Circle(SKETCH_10_R_2)
        with Locations((1.667330314, 59.914483987)):
            Circle(SKETCH_10_R_3)
        with Locations((2.056454436, 64.582741905)):
            Circle(SKETCH_10_R_4)
    extrude(amount=-CUT_EXTRUDE_6_DEPTH, mode=Mode.SUBTRACT)


solid = part_1.part
